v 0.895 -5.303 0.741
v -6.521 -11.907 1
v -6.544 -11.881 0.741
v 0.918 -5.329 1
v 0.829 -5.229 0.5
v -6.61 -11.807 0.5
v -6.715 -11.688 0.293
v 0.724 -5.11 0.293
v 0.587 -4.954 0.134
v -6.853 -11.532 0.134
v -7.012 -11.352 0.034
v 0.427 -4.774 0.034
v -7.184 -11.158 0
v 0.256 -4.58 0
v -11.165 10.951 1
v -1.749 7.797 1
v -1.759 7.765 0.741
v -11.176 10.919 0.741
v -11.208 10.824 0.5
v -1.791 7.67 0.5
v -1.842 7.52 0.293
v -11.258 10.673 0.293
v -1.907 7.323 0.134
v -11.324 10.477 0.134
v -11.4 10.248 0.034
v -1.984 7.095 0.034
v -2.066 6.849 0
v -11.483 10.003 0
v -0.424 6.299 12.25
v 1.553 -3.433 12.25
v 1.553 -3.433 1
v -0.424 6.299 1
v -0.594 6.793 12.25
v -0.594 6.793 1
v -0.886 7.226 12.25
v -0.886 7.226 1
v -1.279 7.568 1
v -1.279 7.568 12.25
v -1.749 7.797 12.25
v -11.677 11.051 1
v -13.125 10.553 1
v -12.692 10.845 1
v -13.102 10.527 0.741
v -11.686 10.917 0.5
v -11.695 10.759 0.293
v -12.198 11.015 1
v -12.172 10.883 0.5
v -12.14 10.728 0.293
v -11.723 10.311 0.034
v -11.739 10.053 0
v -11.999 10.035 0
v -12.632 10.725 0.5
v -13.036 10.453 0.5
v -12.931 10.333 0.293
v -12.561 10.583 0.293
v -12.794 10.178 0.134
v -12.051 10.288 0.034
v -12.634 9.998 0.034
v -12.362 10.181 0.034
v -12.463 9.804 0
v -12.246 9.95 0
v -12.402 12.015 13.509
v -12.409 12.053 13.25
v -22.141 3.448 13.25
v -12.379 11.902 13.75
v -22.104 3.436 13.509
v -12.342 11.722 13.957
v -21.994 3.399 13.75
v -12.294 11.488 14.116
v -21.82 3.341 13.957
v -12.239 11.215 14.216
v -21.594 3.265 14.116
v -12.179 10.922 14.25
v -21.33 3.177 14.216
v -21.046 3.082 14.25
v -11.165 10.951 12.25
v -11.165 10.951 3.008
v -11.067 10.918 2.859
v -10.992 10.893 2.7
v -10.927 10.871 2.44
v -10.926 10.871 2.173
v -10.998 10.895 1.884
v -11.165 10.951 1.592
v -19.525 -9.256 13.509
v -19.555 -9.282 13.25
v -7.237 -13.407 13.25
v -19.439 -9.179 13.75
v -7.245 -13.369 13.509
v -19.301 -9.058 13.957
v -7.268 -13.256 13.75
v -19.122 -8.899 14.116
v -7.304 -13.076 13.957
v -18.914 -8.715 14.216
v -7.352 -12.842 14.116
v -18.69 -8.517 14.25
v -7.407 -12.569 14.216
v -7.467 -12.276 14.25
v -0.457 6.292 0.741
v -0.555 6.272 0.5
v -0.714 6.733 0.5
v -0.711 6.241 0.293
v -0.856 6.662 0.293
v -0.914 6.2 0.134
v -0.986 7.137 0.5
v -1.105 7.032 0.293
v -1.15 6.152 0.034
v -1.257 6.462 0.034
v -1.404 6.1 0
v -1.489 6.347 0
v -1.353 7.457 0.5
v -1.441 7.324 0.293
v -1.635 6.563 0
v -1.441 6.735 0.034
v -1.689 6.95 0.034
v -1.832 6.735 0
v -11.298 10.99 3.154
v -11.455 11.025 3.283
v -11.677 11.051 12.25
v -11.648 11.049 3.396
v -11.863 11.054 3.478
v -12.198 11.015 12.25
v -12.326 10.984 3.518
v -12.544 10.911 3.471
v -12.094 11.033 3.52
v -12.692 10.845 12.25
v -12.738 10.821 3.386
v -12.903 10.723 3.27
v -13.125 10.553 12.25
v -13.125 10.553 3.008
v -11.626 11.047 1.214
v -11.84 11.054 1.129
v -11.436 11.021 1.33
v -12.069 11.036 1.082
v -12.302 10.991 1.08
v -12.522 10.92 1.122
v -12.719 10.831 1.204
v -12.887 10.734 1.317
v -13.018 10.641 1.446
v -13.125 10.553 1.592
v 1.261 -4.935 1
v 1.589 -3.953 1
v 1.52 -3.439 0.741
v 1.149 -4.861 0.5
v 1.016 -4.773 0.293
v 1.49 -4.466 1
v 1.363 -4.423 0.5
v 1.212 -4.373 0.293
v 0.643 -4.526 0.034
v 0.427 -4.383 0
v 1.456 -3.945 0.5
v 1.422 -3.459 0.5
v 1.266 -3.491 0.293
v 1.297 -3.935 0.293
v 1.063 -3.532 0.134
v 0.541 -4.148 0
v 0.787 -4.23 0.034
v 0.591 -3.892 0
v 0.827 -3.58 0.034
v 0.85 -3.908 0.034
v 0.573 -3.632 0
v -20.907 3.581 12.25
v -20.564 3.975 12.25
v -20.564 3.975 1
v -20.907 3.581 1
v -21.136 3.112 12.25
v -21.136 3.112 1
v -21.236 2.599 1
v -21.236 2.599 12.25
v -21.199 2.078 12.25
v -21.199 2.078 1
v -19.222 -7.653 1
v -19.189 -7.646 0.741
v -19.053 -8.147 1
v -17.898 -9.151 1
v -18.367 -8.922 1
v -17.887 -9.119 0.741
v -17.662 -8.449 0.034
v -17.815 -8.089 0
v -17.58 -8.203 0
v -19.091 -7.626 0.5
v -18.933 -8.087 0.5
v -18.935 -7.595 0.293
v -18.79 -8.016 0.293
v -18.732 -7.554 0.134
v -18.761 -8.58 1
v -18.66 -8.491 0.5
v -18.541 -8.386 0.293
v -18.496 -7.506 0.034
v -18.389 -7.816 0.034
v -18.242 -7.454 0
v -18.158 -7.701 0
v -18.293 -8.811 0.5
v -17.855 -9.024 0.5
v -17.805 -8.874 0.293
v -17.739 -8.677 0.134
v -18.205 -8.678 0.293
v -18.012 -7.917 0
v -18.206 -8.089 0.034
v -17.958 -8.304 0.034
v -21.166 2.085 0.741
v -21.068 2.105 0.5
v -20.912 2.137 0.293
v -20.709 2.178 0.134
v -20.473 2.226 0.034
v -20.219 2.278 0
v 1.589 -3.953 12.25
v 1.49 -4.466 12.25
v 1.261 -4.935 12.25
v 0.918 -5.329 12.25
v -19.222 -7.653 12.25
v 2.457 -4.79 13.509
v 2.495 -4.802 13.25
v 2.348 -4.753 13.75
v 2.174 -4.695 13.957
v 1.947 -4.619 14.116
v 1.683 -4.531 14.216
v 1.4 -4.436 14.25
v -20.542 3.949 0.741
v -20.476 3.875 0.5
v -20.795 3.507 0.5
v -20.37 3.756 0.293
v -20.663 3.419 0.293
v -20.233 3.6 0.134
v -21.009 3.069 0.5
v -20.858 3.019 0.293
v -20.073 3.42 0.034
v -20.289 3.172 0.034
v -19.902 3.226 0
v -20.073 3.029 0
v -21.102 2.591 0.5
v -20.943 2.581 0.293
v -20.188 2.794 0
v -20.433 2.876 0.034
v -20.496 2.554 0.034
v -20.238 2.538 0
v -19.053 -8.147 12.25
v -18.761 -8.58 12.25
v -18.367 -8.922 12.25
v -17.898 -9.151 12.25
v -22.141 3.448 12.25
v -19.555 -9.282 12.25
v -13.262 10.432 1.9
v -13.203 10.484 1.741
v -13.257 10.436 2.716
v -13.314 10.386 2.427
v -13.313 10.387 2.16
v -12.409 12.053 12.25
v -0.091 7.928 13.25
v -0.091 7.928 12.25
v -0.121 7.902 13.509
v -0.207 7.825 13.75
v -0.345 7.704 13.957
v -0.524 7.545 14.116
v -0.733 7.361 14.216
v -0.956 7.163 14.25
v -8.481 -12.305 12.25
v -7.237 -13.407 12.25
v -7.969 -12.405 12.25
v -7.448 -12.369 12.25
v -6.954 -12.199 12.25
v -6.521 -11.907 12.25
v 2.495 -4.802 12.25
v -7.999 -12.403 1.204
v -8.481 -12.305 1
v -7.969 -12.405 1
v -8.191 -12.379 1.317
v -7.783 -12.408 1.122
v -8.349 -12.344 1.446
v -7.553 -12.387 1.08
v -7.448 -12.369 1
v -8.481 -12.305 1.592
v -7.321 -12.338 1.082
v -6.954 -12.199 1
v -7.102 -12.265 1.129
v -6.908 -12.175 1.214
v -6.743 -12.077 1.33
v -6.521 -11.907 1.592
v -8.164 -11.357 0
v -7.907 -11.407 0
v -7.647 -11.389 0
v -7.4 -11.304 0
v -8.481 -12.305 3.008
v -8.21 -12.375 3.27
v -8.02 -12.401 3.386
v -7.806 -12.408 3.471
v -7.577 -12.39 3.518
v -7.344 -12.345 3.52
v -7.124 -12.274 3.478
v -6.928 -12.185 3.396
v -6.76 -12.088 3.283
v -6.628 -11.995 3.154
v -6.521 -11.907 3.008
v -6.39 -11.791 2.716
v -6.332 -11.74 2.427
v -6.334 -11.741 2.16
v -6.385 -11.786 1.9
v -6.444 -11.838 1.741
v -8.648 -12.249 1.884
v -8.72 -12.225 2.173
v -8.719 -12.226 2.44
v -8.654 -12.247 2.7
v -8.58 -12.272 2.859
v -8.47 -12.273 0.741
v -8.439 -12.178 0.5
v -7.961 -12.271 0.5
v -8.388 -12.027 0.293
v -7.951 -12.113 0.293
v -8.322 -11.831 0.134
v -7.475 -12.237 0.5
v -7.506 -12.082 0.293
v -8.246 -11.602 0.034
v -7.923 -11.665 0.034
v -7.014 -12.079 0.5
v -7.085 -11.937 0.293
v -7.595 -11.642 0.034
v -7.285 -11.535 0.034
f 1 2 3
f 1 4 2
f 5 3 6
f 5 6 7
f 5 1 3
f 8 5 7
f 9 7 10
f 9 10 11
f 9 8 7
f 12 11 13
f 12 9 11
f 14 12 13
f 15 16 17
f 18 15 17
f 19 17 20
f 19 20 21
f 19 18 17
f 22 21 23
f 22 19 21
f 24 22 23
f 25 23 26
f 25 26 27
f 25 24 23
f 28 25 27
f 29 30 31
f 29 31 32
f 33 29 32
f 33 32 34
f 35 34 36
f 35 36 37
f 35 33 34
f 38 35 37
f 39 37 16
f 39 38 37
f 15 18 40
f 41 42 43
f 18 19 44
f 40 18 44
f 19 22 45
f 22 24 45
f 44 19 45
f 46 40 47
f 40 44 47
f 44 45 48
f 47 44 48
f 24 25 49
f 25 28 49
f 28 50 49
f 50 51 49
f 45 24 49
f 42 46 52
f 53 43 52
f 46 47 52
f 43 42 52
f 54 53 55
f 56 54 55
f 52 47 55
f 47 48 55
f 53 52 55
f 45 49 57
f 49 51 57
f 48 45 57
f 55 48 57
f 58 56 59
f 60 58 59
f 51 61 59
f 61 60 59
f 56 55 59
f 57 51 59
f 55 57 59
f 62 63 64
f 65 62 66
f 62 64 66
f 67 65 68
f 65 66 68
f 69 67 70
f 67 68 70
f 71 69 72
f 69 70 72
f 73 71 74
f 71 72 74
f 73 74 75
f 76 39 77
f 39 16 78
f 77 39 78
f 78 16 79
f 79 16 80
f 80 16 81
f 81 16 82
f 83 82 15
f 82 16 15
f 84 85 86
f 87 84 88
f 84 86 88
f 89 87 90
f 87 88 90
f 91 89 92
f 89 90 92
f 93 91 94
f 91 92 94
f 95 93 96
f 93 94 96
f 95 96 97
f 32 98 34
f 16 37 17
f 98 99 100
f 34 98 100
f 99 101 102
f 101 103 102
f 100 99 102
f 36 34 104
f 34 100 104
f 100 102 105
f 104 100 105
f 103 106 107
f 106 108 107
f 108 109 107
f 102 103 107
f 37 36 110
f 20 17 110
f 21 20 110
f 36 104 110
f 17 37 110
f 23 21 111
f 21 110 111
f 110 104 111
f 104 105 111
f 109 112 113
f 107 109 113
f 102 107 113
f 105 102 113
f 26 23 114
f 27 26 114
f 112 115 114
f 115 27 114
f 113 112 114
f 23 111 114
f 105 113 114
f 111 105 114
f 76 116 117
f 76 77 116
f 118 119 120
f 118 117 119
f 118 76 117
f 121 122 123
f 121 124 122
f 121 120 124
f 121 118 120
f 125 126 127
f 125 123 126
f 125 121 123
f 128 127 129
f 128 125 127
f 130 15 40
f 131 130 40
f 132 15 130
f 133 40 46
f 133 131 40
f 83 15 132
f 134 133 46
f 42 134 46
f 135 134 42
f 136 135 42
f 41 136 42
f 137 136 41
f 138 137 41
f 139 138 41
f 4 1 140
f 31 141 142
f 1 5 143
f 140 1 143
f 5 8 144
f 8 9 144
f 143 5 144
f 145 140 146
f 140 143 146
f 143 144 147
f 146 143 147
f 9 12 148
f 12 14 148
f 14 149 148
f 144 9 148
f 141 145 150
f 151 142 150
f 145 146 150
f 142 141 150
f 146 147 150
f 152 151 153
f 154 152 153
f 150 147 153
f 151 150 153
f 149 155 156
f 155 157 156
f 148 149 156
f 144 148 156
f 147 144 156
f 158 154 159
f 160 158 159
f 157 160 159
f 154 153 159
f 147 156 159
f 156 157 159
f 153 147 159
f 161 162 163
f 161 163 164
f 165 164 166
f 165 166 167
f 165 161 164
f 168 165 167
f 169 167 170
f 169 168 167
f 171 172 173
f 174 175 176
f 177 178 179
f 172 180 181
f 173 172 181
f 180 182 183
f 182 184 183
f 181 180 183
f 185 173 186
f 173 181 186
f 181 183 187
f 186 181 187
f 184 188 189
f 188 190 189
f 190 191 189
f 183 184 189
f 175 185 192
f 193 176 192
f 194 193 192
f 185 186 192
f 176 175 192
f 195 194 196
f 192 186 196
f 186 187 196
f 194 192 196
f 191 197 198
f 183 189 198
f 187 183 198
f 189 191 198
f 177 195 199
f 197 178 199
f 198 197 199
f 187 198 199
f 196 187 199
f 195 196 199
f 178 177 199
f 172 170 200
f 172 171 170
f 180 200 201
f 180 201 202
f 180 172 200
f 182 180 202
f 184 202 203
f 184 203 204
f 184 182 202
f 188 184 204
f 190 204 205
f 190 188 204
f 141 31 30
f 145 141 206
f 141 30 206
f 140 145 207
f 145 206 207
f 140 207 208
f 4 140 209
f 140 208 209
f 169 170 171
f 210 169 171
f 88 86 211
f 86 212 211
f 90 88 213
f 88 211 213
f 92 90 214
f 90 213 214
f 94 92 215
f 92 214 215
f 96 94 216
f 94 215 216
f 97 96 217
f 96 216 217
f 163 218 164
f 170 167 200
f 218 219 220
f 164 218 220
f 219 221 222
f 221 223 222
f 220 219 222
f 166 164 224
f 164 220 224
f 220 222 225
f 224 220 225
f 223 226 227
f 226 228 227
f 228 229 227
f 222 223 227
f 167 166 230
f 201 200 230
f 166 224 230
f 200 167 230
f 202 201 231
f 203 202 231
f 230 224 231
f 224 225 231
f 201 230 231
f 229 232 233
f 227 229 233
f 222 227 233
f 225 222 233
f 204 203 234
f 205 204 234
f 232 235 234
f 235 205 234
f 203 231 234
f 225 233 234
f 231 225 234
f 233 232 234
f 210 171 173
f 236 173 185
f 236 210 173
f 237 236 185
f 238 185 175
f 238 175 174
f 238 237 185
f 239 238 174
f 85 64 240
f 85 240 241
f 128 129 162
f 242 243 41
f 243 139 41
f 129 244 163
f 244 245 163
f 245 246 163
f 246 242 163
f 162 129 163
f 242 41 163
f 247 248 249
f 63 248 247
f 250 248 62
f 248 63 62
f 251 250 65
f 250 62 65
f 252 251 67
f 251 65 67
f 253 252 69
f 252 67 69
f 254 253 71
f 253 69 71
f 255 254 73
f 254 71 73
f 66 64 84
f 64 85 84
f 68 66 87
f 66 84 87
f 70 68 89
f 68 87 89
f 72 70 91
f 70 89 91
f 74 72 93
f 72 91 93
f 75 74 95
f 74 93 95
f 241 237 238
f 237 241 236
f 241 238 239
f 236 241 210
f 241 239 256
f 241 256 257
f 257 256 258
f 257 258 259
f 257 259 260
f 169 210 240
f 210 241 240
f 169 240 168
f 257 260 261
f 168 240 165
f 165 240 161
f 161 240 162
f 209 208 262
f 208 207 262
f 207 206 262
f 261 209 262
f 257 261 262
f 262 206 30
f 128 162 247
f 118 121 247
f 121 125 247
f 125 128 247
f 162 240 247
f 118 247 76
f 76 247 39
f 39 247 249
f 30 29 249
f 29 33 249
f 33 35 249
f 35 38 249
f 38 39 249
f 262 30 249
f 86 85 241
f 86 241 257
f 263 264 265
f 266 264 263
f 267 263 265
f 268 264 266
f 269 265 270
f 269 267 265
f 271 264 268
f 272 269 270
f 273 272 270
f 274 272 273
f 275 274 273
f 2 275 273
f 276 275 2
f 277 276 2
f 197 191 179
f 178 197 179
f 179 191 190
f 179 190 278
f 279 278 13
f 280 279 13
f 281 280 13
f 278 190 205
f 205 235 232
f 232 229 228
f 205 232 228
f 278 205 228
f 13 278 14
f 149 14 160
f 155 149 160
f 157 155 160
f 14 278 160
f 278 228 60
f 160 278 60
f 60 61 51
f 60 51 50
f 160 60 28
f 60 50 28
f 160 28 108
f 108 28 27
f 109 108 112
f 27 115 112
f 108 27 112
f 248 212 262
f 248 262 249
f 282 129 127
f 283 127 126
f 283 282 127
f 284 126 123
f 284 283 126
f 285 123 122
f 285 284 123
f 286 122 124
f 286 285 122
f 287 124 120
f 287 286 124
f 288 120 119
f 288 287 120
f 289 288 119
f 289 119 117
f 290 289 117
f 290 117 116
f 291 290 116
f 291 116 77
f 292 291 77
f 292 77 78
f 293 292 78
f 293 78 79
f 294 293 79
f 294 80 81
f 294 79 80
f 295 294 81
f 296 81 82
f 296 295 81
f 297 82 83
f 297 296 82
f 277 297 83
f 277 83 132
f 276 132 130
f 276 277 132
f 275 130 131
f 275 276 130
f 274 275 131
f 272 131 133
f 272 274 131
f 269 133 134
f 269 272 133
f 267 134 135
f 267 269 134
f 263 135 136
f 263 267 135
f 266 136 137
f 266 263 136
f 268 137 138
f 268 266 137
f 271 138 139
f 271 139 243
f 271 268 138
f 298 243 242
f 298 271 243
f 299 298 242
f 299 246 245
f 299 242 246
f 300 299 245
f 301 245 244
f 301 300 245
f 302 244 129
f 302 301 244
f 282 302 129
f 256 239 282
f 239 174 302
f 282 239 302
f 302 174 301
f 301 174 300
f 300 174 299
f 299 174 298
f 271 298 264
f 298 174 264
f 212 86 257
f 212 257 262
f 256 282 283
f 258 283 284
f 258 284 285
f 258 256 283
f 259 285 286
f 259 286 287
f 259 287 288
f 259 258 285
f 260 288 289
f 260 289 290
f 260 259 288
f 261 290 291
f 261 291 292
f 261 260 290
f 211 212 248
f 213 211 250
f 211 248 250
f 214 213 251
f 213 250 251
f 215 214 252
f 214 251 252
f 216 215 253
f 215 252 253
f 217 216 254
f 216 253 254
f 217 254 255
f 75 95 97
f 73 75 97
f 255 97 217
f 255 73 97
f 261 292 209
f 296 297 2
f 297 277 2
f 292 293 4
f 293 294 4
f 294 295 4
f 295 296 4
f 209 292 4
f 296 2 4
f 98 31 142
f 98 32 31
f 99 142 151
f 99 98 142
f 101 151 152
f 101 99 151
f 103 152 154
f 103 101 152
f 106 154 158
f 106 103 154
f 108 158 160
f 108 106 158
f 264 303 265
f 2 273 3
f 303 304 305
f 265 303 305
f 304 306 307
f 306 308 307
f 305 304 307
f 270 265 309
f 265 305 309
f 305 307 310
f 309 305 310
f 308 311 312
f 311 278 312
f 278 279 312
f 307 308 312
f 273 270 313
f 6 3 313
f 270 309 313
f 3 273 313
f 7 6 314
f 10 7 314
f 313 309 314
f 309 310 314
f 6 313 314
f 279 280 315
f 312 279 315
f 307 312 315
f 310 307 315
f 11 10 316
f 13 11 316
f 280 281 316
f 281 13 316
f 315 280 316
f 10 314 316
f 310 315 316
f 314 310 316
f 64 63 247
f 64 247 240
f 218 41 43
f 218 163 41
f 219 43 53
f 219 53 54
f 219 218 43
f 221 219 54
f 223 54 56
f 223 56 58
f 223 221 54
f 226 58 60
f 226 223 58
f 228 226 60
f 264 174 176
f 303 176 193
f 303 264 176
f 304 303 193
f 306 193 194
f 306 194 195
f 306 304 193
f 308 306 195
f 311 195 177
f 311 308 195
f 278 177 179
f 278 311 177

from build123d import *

# Parameters (mm, degrees)
DODANIE_WYCI_GNI_CIE1_DEPTH     = 14.25
ZAOKR_GLENIE1_R                 = 2
DODANIE_WYCI_GNI_CIE2_DEPTH     = 2
ZAOKR_GLENIE2_R                 = 1
ZAOKR_GLENIE3_R                 = 1
WYTNIJ_WYCI_GNI_CIE1_DEPTH      = 30.954621541
WYTNIJ_WYCI_GNI_CIE1_DEPTH_BACK = 30.954621541
SZKIC4_R                        = 1.225


with BuildPart() as part:
    # Szkic1 → Dodanie-wyciągnięcie1 (new body)
    with BuildSketch(Plane.XY):
        Polygon((1.783068787, -4.564092652), (-0.653727134, 7.430712848), (-12.25993137, 11.317788426), (-21.429339686, 3.210058505), (-18.992543765, -8.784746995), (-7.386339528, -12.671822573), align=None)
    extrude(amount=DODANIE_WYCI_GNI_CIE1_DEPTH)

    # Zaokrąglenie1
    zaokr_glenie1_edges = [part.edges().sort_by_distance(p)[0] for p in [
        (-7.386339528, -12.671822573, 7.125),
        (-18.992543765, -8.784746995, 7.125),
        (-21.429339686, 3.210058505, 7.125),
        (-12.25993137, 11.317788426, 7.125),
        (-0.653727134, 7.430712848, 7.125),
        (1.783068787, -4.564092652, 7.125),
    ]]
    fillet(zaokr_glenie1_edges, radius=ZAOKR_GLENIE1_R)

    # Szkic3 → Dodanie-wyciągnięcie2 (add)
    with BuildSketch(Plane.XY.offset(14.25)):
        Polygon((-0.091452095, 7.927884965), (-12.409357535, 12.053318952), (-22.141040889, 3.448416913), (-19.554818803, -9.281919113), (-7.236913363, -13.407353099), (2.494769991, -4.80245106), align=None)
    extrude(amount=-DODANIE_WYCI_GNI_CIE2_DEPTH)

    # Zaokrąglenie2
    zaokr_glenie2_edges = [part.edges().sort_by_distance(p)[0] for p in [
        (-6.456829252, 9.374250637, 0),
        (-2.80163537, -8.617957613, 0),
        (-13.189441647, -10.728284784, 0),
        (-20.210941725, -2.787344245, 0),
        (-16.844635528, 7.263923465, 0),
        (0.564670827, 1.433310098, 0),
        (-12.198333493, 11.014581025, 0),
        (-21.135955436, 3.111800131, 0),
        (-18.760757392, -8.579797968, 0),
        (-7.447937406, -12.368615173, 0),
        (1.489684537, -4.465834278, 0),
        (-0.885513507, 7.225763821, 0),
    ]]
    fillet(zaokr_glenie2_edges, radius=ZAOKR_GLENIE2_R)

    # Zaokrąglenie3
    zaokr_glenie3_edges = [part.edges().sort_by_distance(p)[0] for p in [
        (1.201658948, 1.562716953, 14.25),
        (-6.250404815, 9.990601959, 14.25),
        (-17.275199212, 7.750867932, 14.25),
        (-20.847929846, -2.9167511, 14.25),
        (-13.395866083, -11.344636106, 14.25),
        (-2.371071686, -9.10490208, 14.25),
    ]]
    fillet(zaokr_glenie3_edges, radius=ZAOKR_GLENIE3_R)

    # Szkic4 → Wytnij-wyciągnięcie1 (cut, two sides: drawn at the far end of the back side and taken through both)
    with BuildSketch(Plane(origin=(-0.257260592, 1.266331223, 0), x_dir=(0.9799817241599056, 0.19908746899937949, 0), z_dir=(-0.19908746899937946, 0.9799817241599055, 0)).offset(-WYTNIJ_WYCI_GNI_CIE1_DEPTH_BACK)):
        with Locations(Location((-9.76127883, -2.3, 0), (0, 0, 215.281261827))):
            Circle(SZKIC4_R)
    extrude(amount=WYTNIJ_WYCI_GNI_CIE1_DEPTH + WYTNIJ_WYCI_GNI_CIE1_DEPTH_BACK, mode=Mode.SUBTRACT)


solid = part.part
